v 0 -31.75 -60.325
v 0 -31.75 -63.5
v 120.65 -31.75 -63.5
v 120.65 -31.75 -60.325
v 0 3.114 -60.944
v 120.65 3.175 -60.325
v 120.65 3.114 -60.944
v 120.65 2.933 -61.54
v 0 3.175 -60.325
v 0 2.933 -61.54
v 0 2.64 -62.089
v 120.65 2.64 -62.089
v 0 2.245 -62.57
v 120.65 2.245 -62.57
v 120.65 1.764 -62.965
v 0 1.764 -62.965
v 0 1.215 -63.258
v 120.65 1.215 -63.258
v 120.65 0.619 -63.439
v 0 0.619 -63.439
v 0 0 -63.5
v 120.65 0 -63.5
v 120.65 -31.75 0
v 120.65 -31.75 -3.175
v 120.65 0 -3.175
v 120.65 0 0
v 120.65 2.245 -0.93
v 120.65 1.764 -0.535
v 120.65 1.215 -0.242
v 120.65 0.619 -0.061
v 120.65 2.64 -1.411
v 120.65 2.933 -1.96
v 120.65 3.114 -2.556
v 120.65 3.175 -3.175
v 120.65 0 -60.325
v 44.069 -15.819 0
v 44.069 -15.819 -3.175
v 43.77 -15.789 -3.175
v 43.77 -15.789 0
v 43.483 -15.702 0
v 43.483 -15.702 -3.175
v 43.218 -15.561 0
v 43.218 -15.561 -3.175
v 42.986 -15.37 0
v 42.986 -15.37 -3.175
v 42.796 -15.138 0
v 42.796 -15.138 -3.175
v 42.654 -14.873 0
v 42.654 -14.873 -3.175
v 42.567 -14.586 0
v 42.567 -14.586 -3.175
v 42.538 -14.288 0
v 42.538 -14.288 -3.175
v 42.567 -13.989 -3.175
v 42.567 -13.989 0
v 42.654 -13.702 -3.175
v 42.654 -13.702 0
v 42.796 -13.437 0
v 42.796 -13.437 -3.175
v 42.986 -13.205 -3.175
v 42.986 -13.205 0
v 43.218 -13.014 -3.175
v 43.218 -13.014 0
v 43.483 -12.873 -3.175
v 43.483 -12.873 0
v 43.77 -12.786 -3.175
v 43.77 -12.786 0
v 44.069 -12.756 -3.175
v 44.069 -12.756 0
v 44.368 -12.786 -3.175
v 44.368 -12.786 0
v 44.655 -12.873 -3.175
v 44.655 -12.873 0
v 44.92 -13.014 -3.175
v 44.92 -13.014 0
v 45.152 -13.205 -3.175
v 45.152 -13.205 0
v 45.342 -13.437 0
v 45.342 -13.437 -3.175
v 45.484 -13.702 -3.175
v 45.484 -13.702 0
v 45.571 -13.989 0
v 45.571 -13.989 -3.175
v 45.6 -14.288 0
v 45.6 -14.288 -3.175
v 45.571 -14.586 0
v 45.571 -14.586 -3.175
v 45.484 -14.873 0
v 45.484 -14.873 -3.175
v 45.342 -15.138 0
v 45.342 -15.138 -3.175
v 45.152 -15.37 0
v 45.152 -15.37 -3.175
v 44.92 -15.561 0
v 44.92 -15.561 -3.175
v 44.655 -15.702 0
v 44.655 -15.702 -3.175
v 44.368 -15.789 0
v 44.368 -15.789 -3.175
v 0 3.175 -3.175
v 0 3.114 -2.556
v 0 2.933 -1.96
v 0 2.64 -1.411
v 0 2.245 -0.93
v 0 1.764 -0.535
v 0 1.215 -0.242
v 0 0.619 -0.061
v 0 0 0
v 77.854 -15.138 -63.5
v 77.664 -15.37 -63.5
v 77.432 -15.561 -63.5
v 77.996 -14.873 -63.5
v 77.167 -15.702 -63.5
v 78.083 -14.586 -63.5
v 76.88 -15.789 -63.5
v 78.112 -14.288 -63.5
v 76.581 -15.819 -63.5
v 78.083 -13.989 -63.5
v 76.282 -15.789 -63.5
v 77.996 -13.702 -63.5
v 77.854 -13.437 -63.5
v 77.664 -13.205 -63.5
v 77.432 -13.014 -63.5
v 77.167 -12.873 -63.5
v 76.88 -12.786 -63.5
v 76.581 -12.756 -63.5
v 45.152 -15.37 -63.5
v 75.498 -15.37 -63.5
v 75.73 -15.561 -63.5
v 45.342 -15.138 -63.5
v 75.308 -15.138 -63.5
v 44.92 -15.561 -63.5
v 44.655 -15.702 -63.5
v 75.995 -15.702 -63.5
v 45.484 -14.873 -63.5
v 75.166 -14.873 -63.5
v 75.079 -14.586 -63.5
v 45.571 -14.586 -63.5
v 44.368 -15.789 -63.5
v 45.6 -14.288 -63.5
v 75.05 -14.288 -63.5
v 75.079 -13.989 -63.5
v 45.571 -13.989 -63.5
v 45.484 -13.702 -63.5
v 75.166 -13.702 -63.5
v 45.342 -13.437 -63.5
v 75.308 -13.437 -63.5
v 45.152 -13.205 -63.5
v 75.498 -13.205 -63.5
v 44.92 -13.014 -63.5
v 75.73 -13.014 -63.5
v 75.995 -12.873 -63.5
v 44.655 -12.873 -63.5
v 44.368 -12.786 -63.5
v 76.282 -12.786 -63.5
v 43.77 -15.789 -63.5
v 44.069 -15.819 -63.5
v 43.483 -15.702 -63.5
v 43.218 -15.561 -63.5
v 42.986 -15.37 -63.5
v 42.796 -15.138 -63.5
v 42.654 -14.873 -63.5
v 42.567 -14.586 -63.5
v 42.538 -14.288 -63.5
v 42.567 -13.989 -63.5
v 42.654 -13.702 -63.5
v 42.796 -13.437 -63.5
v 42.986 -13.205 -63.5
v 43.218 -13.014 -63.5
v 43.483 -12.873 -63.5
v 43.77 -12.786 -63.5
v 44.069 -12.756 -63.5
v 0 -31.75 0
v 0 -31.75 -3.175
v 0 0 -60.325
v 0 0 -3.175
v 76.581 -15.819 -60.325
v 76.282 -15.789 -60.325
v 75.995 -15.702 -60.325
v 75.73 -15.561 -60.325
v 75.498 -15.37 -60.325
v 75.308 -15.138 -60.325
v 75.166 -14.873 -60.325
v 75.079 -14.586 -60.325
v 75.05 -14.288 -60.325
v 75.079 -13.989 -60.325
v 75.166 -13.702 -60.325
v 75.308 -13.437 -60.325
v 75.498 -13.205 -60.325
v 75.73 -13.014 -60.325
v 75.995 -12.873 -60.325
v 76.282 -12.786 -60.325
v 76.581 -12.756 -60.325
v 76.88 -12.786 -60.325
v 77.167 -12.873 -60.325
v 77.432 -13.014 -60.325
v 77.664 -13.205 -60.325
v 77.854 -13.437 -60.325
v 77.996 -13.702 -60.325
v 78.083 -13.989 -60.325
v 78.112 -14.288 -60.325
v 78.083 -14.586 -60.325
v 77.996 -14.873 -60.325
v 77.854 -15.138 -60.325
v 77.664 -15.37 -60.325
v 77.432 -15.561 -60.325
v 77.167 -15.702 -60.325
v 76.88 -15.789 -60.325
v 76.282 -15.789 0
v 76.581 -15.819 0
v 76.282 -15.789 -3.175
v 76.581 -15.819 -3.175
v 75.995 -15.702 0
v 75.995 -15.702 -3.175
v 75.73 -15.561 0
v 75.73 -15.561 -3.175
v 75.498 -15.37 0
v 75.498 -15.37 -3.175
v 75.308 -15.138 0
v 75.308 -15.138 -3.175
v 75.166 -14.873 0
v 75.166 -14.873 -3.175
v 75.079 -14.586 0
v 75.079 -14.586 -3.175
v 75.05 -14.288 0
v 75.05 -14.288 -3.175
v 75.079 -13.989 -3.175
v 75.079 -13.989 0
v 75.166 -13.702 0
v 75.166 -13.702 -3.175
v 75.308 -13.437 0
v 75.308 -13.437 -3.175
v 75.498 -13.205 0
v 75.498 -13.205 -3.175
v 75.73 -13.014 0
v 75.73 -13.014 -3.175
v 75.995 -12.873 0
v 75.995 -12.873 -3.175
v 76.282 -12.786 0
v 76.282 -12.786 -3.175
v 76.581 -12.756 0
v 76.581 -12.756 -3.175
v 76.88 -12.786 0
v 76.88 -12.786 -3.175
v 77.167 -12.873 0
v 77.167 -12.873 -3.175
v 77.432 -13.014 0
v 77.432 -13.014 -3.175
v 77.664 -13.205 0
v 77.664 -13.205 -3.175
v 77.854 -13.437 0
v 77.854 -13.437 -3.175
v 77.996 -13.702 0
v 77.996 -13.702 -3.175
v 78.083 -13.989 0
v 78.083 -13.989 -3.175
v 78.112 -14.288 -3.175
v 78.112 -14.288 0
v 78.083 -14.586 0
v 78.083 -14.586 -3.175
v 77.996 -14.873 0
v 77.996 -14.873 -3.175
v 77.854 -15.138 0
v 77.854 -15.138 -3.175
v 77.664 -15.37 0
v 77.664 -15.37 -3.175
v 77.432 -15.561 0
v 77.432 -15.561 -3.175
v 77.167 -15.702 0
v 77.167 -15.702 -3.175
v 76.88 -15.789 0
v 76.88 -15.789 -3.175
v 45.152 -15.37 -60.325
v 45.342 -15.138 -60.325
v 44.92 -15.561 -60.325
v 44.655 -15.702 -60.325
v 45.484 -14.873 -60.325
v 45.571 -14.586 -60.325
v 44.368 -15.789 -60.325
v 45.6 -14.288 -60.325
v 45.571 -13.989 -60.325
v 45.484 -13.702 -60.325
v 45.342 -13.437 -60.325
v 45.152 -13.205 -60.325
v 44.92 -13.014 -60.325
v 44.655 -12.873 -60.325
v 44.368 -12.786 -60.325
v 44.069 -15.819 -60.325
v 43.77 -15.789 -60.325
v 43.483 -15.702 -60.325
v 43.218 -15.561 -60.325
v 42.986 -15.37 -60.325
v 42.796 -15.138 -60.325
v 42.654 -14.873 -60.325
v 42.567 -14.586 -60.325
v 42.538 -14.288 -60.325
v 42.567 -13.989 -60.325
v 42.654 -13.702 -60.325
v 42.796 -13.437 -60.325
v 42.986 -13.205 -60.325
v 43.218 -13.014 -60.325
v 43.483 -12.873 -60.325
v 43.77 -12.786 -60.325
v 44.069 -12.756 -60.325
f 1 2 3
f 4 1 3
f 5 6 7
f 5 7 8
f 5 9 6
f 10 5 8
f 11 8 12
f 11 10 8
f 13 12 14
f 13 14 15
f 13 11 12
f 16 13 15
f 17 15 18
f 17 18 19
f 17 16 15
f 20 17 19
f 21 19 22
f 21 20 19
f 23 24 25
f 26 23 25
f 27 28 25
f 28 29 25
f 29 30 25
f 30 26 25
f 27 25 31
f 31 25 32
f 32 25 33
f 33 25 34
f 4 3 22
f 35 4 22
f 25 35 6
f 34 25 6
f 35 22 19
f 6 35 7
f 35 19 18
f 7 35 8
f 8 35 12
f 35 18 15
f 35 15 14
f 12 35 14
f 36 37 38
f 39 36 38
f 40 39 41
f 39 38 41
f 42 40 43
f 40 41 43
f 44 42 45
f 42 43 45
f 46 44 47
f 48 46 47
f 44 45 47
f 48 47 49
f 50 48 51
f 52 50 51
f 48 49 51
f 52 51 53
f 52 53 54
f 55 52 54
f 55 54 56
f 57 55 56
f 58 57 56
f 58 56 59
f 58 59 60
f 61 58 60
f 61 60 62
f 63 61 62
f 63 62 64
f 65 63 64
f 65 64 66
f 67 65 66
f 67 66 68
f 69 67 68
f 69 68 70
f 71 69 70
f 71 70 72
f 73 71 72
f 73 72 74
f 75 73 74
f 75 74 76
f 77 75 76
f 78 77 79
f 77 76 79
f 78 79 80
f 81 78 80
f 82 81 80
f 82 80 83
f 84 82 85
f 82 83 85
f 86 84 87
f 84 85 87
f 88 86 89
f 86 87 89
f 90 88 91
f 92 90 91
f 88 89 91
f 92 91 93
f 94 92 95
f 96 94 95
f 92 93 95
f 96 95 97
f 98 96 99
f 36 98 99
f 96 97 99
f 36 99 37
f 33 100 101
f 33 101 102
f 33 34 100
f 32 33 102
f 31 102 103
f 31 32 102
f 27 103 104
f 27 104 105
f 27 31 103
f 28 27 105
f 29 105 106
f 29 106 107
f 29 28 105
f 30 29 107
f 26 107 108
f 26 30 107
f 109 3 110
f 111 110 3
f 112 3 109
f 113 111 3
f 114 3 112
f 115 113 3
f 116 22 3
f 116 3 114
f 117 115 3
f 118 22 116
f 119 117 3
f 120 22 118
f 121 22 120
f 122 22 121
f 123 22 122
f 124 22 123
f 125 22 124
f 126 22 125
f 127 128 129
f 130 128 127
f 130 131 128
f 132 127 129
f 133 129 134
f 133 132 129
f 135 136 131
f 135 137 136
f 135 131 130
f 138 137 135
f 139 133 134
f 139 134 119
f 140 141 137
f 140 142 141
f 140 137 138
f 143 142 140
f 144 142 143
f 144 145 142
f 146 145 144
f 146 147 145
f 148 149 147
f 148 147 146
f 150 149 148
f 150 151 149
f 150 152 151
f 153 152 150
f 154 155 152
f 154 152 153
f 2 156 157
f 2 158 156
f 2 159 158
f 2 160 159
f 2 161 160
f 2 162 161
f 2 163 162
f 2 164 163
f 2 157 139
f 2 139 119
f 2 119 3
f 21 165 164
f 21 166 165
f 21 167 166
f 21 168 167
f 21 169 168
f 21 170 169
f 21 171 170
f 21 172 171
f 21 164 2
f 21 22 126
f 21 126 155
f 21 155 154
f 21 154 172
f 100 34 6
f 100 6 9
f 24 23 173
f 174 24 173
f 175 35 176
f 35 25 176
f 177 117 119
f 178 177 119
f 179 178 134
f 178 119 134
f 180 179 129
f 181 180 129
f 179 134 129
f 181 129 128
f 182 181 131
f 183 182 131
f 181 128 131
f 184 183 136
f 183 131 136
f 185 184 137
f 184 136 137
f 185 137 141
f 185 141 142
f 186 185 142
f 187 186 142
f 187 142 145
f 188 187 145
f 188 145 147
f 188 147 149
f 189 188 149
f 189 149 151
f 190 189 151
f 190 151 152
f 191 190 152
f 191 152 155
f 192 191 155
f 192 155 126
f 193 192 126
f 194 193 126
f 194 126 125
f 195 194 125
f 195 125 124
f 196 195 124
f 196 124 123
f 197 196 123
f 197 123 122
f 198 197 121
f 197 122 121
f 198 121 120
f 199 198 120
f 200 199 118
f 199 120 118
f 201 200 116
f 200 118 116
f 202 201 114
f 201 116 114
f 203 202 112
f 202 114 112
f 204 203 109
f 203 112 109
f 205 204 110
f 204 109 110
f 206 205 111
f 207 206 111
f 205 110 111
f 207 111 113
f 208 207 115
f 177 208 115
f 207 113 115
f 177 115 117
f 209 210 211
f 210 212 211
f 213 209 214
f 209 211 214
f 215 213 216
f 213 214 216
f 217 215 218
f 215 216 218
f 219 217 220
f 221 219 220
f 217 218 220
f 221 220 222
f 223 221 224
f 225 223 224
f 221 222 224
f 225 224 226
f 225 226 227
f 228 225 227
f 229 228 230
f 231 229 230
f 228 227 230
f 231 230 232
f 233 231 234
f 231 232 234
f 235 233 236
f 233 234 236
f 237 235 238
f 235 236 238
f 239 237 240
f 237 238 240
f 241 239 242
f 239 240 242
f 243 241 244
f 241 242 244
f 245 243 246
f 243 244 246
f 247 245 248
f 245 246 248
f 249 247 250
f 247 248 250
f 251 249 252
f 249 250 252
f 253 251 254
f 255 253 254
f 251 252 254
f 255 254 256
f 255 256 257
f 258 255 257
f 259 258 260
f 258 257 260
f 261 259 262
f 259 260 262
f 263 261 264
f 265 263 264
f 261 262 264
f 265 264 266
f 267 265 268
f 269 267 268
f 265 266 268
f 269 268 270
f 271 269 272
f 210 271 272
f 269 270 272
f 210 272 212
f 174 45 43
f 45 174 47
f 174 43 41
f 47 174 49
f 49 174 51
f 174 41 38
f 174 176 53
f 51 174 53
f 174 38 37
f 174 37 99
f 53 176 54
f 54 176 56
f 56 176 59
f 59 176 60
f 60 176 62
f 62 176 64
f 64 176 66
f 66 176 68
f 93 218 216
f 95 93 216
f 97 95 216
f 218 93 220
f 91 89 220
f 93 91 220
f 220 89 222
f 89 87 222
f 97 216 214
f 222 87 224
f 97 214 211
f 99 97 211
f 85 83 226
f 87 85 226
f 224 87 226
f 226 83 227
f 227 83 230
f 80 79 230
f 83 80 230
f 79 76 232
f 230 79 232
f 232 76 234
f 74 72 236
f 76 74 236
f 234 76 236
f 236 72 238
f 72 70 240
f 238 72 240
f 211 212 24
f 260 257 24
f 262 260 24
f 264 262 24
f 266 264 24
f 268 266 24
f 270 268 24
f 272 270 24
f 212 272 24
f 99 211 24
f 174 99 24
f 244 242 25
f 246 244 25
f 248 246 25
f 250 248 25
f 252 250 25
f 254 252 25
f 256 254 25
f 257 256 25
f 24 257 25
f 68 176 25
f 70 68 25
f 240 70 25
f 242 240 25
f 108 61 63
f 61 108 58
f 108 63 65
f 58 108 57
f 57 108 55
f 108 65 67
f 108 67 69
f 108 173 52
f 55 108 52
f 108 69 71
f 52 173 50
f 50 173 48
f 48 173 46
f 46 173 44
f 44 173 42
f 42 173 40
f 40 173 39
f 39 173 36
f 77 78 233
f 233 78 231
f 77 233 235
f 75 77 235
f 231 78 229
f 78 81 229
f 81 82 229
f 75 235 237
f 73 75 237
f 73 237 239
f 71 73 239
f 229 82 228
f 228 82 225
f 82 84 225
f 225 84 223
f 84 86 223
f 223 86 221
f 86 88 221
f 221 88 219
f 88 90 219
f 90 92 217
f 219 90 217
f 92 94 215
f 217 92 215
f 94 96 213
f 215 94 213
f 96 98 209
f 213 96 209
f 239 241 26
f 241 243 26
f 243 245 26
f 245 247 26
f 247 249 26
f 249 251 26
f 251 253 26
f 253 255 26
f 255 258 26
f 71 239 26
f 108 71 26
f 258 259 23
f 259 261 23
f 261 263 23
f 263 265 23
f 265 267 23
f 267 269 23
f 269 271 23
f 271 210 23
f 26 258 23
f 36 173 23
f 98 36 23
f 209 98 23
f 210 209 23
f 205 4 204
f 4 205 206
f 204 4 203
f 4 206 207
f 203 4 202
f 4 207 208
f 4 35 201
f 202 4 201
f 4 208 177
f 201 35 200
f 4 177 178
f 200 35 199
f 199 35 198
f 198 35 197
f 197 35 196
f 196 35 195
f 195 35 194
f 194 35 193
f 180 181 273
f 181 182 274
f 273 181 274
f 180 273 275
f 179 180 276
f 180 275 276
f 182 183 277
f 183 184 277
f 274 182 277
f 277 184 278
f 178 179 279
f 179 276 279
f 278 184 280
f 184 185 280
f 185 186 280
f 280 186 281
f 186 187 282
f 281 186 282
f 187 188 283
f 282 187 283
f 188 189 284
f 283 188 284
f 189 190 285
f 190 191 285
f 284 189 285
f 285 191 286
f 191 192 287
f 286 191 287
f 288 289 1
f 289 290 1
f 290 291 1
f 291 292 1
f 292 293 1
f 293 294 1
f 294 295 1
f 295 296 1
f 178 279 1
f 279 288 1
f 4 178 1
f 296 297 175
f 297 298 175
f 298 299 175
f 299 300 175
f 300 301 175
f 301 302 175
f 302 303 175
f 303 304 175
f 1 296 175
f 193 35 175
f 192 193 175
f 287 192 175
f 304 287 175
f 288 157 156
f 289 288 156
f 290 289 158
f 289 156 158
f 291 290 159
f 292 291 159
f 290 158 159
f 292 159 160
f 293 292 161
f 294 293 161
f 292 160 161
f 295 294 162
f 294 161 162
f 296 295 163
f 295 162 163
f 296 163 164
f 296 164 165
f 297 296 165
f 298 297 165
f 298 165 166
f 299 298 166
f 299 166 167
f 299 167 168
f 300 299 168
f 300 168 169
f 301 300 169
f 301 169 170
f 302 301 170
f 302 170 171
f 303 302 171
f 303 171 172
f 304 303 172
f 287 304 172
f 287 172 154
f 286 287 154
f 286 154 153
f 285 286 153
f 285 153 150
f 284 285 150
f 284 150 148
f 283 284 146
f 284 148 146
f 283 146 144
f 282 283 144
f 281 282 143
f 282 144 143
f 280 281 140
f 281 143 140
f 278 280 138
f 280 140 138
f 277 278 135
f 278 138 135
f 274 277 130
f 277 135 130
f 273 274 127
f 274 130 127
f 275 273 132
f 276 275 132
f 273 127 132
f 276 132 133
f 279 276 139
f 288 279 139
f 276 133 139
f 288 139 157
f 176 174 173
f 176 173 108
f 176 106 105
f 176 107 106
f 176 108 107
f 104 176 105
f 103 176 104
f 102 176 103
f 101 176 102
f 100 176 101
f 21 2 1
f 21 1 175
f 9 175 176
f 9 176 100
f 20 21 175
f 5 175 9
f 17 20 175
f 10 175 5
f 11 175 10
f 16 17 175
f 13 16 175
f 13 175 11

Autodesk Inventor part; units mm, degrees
ref_plane "YZ Plane" through (0, 0, 0) normal (1, 0, 0) x (0, 1, 0)
ref_plane "XZ Plane" through (0, 0, 0) normal (0, 1, 0) x (-1, 0, 0)
ref_plane "XY Plane" through (0, 0, 0) normal (0, 0, 1) x (1, 0, 0)
sketch "Sketch1" plane through (0, 0, 0) normal (0, 1, 0) x (-1, 0, 0)
  line L0 (0, 0) -> (-120.65, 0)
  line L1 (-120.65, 0) -> (-120.65, -63.5)
  line L2 (-120.65, -63.5) -> (0, -63.5)
  line L3 (0, -63.5) -> (0, 0)
  dimension "d0" = 120.65
  dimension "d1" = 63.5
extrude "Extrusion1" add sketch "Sketch1" along normal blind 3.175
sketch "Sketch2" plane through (0, 0, 0) normal (0, 0, 1) x (1, 0, 0)
  line L0 (0, 0) -> (120.65, 0) projected
  line L1 (0, 0) -> (120.65, 0)
  line L2 (120.65, 0) -> (120.65, -31.75)
  line L3 (120.65, -31.75) -> (0, -31.75)
  line L4 (0, -31.75) -> (0, 0)
  dimension "d4" = 31.75
extrude "Extrusion2" add sketch "Sketch2" against normal blind 3.175
sketch "Sketch4" plane through (120.65, 0, -63.5) normal (0, 0, -1) x (-1, 0, 0)
  line L0 (0, -31.75) -> (0, 3.175) projected
  line L1 (120.65, -31.75) -> (120.65, 3.175) projected
  line L2 (0, 3.175) -> (120.65, 3.175)
  line L3 (120.65, 3.175) -> (120.65, -31.75)
  line L4 (120.65, -31.75) -> (0, -31.75)
  line L5 (0, -31.75) -> (0, 3.175)
  point P0 (120.65, 0)
extrude "Extrusion4" add sketch "Sketch4" against normal blind 3.175
fillet "Fillet1" radius 3.175 1 edges at (60.325, 3.175, 0)
fillet "Fillet2" radius 3.175 1 edges at (60.325, 3.175, -63.5)
sketch "Sketch5" plane through (0, -31.75, 0) normal (0, 0, 1) x (1, 0, 0)
  line L0 (120.65, 0) -> (0, 0) projected
  line L1 (120.65, 34.925) -> (0, 34.925) projected
  line L2 (120.65, 0) -> (120.65, 31.75) projected
  line L3 (0, 0) -> (0, 31.75) projected
  point P0 (44.069, 17.4625)
  point P1 (76.581, 17.4625)
  point P2 (60.325, 17.4625)
  dimension "d14" = 32.512
  dimension "d15" = 34.925
  dimension "d16" = 17.4625
  dimension "d17" = 17.4625
  dimension "d18" = 120.65
  dimension "d20" = 16.256
  dimension "d21" = 17.4625
  dimension "d22" = 60.325
  dimension "d23" = 16.256
hole "Hole1" at (44.069, -14.2875, 0) at (76.581, -14.2875, 0) direction (0, 0, -1) diameter 3.0625 end through all
equation "\"d16\" = 0.5 * d15"
equation "\"d17\" = d16"
equation "\"d20\" = 0.5 * d14"
equation "\"d21\" = d16"
equation "\"d22\" = 0.5 * d18"
properties part number "track bracket"
